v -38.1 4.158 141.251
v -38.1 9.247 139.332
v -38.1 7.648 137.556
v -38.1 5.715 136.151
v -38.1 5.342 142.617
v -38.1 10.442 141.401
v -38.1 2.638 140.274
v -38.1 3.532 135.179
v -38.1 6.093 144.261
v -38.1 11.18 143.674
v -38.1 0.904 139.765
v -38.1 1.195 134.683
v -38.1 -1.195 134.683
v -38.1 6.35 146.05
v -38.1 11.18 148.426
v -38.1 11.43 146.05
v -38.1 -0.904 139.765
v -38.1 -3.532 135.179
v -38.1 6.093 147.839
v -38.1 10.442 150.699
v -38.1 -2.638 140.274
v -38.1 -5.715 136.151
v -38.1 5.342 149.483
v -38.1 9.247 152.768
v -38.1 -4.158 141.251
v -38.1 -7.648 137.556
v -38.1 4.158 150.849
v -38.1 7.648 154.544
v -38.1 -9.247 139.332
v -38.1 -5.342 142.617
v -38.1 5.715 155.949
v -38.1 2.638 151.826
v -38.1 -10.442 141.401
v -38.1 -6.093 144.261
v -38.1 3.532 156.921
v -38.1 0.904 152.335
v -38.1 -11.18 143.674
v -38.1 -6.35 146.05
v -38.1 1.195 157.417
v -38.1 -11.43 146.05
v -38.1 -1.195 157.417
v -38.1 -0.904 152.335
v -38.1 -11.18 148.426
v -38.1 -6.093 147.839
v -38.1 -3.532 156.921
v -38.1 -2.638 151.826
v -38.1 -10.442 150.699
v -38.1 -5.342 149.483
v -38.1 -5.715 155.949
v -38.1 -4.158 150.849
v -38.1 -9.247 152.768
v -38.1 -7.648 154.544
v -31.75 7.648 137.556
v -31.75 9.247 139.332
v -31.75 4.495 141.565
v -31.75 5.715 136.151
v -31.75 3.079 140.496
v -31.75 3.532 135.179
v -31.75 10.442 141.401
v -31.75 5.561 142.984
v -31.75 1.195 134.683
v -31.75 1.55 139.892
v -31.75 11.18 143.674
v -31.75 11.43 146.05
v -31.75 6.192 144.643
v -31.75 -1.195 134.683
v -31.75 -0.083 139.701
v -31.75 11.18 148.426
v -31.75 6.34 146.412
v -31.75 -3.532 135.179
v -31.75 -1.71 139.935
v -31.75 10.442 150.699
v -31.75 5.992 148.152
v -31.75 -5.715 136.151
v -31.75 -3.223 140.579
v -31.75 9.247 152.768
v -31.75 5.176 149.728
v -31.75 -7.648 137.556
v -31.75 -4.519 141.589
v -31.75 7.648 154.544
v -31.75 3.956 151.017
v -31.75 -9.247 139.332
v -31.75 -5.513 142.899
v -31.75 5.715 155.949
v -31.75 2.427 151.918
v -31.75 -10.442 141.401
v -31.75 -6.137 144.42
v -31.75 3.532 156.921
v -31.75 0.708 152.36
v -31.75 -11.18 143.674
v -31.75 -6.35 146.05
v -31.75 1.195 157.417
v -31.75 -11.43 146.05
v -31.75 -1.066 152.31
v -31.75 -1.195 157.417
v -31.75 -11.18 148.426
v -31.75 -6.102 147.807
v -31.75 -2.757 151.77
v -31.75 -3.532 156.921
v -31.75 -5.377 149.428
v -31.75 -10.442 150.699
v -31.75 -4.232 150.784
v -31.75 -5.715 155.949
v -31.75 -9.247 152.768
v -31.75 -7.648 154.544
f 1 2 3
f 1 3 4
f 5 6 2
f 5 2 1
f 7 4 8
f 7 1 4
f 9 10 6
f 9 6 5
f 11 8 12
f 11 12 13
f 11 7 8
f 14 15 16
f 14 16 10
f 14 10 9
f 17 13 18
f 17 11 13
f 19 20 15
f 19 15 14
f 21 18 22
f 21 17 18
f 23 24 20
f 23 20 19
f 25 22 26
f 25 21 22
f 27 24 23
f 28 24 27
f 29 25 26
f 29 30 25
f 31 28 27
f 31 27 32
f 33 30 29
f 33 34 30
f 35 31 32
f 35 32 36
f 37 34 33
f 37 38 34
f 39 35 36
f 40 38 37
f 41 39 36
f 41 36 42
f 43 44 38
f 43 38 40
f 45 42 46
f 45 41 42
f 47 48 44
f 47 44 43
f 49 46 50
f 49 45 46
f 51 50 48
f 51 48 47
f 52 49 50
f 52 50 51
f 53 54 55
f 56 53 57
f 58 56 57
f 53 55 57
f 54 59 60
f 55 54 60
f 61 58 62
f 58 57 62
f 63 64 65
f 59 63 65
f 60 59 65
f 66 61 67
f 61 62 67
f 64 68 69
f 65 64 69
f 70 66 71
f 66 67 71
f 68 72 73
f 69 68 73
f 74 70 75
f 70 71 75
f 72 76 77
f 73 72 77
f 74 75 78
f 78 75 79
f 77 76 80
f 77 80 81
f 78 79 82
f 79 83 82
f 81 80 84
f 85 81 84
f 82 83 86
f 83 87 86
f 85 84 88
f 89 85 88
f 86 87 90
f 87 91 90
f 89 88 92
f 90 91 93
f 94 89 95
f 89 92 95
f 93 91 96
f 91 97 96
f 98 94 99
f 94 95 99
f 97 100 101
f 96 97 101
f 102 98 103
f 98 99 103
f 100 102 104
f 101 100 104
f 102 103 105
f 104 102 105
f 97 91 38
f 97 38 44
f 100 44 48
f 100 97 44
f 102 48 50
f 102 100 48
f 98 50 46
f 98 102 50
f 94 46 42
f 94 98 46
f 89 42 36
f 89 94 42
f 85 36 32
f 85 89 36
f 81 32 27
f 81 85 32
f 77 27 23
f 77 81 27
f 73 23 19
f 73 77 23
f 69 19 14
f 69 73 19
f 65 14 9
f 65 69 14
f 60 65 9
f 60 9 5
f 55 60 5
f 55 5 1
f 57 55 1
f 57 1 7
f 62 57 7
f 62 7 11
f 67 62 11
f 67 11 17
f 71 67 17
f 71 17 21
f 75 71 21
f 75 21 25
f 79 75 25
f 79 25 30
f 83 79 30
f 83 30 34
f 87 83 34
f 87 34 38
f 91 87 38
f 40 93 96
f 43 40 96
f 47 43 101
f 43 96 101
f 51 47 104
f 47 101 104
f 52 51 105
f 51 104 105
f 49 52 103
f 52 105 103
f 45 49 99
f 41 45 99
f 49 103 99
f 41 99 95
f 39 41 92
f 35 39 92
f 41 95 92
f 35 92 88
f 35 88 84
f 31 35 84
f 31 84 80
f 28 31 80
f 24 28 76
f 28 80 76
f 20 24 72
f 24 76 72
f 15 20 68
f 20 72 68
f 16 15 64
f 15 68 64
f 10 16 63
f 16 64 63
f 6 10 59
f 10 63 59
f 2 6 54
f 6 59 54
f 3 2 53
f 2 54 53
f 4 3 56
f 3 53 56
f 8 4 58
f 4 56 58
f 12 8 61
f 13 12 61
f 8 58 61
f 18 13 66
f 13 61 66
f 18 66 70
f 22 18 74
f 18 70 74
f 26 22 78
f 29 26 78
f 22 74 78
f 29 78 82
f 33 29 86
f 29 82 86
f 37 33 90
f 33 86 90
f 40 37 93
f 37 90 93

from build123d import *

# Parameters (mm, degrees)
F0_W      = 63.5
F0_H      = 63.5
F0_W_2    = 50.8
F0_H_2    = 50.8
F1_DEPTH  = 165.1
F3_R      = 6.35
F4_DEPTH  = 25.4
F6_DEPTH  = 25.4
F7_R      = 6.35
F8_DEPTH  = 63.501
F9_W      = 145.7979530096
F9_H      = 377.9422044754
F9_W_2    = 50.8
F9_H_2    = 292.1
F10_DEPTH = 63.5
F11_W     = 97.6704657078
F11_H     = 338.8985395432
F12_DEPTH = 57.151
F13_R     = 11.43
F13_R_2   = 6.35
F14_DEPTH = 6.35
F15_W     = 170.8157360554
F15_H     = 347.1174836159
F16_DEPTH = 25.4


# Not quite as in the source:
# - ends of sketch curves that miss each other by under 0.0002 mm in the source are joined


with BuildPart() as f1:
    # F0 (on Top) → F1 (new body, symmetric)
    with BuildSketch(Plane.XY):
        Rectangle(F0_W, F0_H)
        Rectangle(F0_W_2, F0_H_2, mode=Mode.SUBTRACT)
    extrude(amount=F1_DEPTH, both=True)

    # F3 (on face) → F4 (cut)
    with BuildSketch(Plane.YZ.offset(31.75)):
        with Locations((0, 146.05)):
            Circle(F3_R)
        with BuildLine():
            ThreePointArc((10.1385245046, 129.1766616857), (14.6288058895, 132.8781640138), (17.8406687878, 137.7307595176))
            ThreePointArc((17.8406687878, 137.7307595176), (19.4934269332, 143.3103775076), (19.4426449846, 149.1294124443))
            ThreePointArc((19.4426449846, 149.1294124443), (15.0835370951, 152.2964897102), (11.9164598293, 147.9373818207))
            ThreePointArc((11.9164598293, 147.9373818207), (11.9475842494, 144.3708765369), (10.9346034506, 140.9511106721))
            ThreePointArc((10.9346034506, 140.9511106721), (8.9660423194, 137.9769392343), (6.2139343738, 135.708276517))
            ThreePointArc((6.2139343738, 135.708276517), (4.9104220235, 130.4801740359), (10.1385245046, 129.1766616857))
        make_face()
        with BuildLine():
            ThreePointArc((-10.1385245046, 129.1766616857), (-4.9104220235, 130.4801740359), (-6.2139343738, 135.708276517))
            ThreePointArc((-6.2139343738, 135.708276517), (-8.9660423194, 137.9769392343), (-10.9346034506, 140.9511106721))
            ThreePointArc((-10.9346034506, 140.9511106721), (-11.9475842494, 144.3708765369), (-11.9164598293, 147.9373818207))
            ThreePointArc((-11.9164598293, 147.9373818207), (-15.0835370951, 152.2964897102), (-19.4426449846, 149.1294124443))
            ThreePointArc((-19.4426449846, 149.1294124443), (-19.4934269332, 143.3103775076), (-17.8406687878, 137.7307595176))
            ThreePointArc((-17.8406687878, 137.7307595176), (-14.6288058895, 132.8781640138), (-10.1385245046, 129.1766616857))
        make_face()
    extrude(amount=-F4_DEPTH, mode=Mode.SUBTRACT)

    # F5 (on face) → F6 (cut)
    with BuildSketch(Plane(origin=(-31.75, 0, 0), x_dir=(0, -1, 0), z_dir=(-1, 0, 0))):
        with BuildLine():
            ThreePointArc((-3.0785410886, 140.4961648597), (3.2228686048, 140.5786548312), (6.35, 146.05))
            ThreePointArc((6.35, 146.05), (-3.2228686048, 151.5213451688), (-3.0785410886, 140.4961648597))
        make_face()
        with BuildLine():
            ThreePointArc((-5.7913527214, 132.1654121492), (-6.0549491708, 133.1322727306), (-6.7727903948, 133.8315626913))
            ThreePointArc((-6.7727903948, 133.8315626913), (-9.3377562721, 131.1985515677), (-5.7913527214, 132.1654121492))
        make_face()
        with BuildLine():
            ThreePointArc((3.1226517792, 134.3961049058), (0.4285749428, 129.7298269458), (5.0948529028, 127.0357501095))
            ThreePointArc((5.0948529028, 127.0357501095), (17.8406687878, 137.7307595176), (17.8406687878, 154.3692404824))
            ThreePointArc((17.8406687878, 154.3692404824), (12.777460542, 156.2120975737), (10.9346034506, 151.1488893279))
            ThreePointArc((10.9346034506, 151.1488893279), (10.9346034506, 140.9511106721), (3.1226517792, 134.3961049058))
        make_face()
    extrude(amount=-F6_DEPTH, mode=Mode.SUBTRACT)

    # F7 (on face) → F8 (cut, through all)
    with BuildSketch(Plane.YZ.offset(31.75)):
        with BuildLine():
            ThreePointArc((-8.89, 107.949999693), (-15.239999693, 101.6), (-8.89, 95.250000307))
            ThreePointArc((-8.89, 95.250000307), (3.81, 82.55), (-8.89, 69.85))
            ThreePointArc((-8.89, 69.85), (-15.239999693, 63.5), (-8.89, 57.150000307))
            ThreePointArc((-8.89, 57.150000307), (16.509999693, 82.55), (-8.89, 107.949999693))
        make_face()
        with BuildLine():
            ThreePointArc((8.89, 3.07e-07), (15.239999693, 6.35), (8.89, 12.699999693))
            ThreePointArc((8.89, 12.699999693), (-3.81, 25.4), (8.89, 38.1))
            ThreePointArc((8.89, 38.1), (15.24, 44.45), (8.89, 50.8))
            ThreePointArc((8.89, 50.8), (-16.509999693, 25.4), (8.89, 3.07e-07))
        make_face()
        with BuildLine():
            ThreePointArc((-8.89, -6.350000307), (-15.239999693, -12.7), (-8.89, -19.049999693))
            ThreePointArc((-8.89, -19.049999693), (3.81, -31.75), (-8.89, -44.45))
            ThreePointArc((-8.89, -44.45), (-15.239999693, -50.8), (-8.89, -57.149999693))
            ThreePointArc((-8.89, -57.149999693), (16.509999693, -31.75), (-8.89, -6.350000307))
        make_face()
        with BuildLine():
            ThreePointArc((8.89, -114.299999693), (15.239999693, -107.95), (8.89, -101.600000307))
            ThreePointArc((8.89, -101.600000307), (-3.81, -88.9), (8.89, -76.2))
            ThreePointArc((8.89, -76.2), (15.24, -69.85), (8.89, -63.5))
            ThreePointArc((8.89, -63.5), (-16.509999693, -88.9), (8.89, -114.299999693))
        make_face()
        with Locations((-8.89, 82.55)):
            Circle(F7_R)
        with Locations((8.89, 25.4)):
            Circle(F7_R)
        with Locations((8.89, -88.9)):
            Circle(F7_R)
        with Locations((-8.89, -31.75)):
            Circle(F7_R)
    extrude(amount=-F8_DEPTH, mode=Mode.SUBTRACT)

    # F9 (on face) → F10 (cut, symmetric)
    with BuildSketch(Plane(origin=(25.4, 0, 0), x_dir=(0, -1, 0), z_dir=(-1, 0, 0))):
        Rectangle(F9_W, F9_H)
        with Locations((0, 19.05)):
            Rectangle(F9_W_2, F9_H_2, mode=Mode.SUBTRACT)
    extrude(amount=F10_DEPTH, both=True, mode=Mode.SUBTRACT)

    # F11 (on face) → F12 (cut, through all)
    with BuildSketch(Plane.YZ.offset(-25.4)):
        Rectangle(F11_W, F11_H)
    extrude(amount=F12_DEPTH, mode=Mode.SUBTRACT)

    # F13 (on face) → F14 (join)
    with BuildSketch(Plane(origin=(-31.75, 0, 0), x_dir=(0, -1, 0), z_dir=(-1, 0, 0))):
        with Locations((0, 146.05)):
            Circle(F13_R)
        with Locations((0, 146.05)):
            Circle(F13_R_2, mode=Mode.SUBTRACT)
    extrude(amount=F14_DEPTH)

    # F15 (on face) → F16 (cut)
    with BuildSketch(Plane(origin=(-31.75, 0, 0), x_dir=(0, -1, 0), z_dir=(-1, 0, 0))):
        Rectangle(F15_W, F15_H)
    extrude(amount=-F16_DEPTH, mode=Mode.SUBTRACT)


solid = f1.part
